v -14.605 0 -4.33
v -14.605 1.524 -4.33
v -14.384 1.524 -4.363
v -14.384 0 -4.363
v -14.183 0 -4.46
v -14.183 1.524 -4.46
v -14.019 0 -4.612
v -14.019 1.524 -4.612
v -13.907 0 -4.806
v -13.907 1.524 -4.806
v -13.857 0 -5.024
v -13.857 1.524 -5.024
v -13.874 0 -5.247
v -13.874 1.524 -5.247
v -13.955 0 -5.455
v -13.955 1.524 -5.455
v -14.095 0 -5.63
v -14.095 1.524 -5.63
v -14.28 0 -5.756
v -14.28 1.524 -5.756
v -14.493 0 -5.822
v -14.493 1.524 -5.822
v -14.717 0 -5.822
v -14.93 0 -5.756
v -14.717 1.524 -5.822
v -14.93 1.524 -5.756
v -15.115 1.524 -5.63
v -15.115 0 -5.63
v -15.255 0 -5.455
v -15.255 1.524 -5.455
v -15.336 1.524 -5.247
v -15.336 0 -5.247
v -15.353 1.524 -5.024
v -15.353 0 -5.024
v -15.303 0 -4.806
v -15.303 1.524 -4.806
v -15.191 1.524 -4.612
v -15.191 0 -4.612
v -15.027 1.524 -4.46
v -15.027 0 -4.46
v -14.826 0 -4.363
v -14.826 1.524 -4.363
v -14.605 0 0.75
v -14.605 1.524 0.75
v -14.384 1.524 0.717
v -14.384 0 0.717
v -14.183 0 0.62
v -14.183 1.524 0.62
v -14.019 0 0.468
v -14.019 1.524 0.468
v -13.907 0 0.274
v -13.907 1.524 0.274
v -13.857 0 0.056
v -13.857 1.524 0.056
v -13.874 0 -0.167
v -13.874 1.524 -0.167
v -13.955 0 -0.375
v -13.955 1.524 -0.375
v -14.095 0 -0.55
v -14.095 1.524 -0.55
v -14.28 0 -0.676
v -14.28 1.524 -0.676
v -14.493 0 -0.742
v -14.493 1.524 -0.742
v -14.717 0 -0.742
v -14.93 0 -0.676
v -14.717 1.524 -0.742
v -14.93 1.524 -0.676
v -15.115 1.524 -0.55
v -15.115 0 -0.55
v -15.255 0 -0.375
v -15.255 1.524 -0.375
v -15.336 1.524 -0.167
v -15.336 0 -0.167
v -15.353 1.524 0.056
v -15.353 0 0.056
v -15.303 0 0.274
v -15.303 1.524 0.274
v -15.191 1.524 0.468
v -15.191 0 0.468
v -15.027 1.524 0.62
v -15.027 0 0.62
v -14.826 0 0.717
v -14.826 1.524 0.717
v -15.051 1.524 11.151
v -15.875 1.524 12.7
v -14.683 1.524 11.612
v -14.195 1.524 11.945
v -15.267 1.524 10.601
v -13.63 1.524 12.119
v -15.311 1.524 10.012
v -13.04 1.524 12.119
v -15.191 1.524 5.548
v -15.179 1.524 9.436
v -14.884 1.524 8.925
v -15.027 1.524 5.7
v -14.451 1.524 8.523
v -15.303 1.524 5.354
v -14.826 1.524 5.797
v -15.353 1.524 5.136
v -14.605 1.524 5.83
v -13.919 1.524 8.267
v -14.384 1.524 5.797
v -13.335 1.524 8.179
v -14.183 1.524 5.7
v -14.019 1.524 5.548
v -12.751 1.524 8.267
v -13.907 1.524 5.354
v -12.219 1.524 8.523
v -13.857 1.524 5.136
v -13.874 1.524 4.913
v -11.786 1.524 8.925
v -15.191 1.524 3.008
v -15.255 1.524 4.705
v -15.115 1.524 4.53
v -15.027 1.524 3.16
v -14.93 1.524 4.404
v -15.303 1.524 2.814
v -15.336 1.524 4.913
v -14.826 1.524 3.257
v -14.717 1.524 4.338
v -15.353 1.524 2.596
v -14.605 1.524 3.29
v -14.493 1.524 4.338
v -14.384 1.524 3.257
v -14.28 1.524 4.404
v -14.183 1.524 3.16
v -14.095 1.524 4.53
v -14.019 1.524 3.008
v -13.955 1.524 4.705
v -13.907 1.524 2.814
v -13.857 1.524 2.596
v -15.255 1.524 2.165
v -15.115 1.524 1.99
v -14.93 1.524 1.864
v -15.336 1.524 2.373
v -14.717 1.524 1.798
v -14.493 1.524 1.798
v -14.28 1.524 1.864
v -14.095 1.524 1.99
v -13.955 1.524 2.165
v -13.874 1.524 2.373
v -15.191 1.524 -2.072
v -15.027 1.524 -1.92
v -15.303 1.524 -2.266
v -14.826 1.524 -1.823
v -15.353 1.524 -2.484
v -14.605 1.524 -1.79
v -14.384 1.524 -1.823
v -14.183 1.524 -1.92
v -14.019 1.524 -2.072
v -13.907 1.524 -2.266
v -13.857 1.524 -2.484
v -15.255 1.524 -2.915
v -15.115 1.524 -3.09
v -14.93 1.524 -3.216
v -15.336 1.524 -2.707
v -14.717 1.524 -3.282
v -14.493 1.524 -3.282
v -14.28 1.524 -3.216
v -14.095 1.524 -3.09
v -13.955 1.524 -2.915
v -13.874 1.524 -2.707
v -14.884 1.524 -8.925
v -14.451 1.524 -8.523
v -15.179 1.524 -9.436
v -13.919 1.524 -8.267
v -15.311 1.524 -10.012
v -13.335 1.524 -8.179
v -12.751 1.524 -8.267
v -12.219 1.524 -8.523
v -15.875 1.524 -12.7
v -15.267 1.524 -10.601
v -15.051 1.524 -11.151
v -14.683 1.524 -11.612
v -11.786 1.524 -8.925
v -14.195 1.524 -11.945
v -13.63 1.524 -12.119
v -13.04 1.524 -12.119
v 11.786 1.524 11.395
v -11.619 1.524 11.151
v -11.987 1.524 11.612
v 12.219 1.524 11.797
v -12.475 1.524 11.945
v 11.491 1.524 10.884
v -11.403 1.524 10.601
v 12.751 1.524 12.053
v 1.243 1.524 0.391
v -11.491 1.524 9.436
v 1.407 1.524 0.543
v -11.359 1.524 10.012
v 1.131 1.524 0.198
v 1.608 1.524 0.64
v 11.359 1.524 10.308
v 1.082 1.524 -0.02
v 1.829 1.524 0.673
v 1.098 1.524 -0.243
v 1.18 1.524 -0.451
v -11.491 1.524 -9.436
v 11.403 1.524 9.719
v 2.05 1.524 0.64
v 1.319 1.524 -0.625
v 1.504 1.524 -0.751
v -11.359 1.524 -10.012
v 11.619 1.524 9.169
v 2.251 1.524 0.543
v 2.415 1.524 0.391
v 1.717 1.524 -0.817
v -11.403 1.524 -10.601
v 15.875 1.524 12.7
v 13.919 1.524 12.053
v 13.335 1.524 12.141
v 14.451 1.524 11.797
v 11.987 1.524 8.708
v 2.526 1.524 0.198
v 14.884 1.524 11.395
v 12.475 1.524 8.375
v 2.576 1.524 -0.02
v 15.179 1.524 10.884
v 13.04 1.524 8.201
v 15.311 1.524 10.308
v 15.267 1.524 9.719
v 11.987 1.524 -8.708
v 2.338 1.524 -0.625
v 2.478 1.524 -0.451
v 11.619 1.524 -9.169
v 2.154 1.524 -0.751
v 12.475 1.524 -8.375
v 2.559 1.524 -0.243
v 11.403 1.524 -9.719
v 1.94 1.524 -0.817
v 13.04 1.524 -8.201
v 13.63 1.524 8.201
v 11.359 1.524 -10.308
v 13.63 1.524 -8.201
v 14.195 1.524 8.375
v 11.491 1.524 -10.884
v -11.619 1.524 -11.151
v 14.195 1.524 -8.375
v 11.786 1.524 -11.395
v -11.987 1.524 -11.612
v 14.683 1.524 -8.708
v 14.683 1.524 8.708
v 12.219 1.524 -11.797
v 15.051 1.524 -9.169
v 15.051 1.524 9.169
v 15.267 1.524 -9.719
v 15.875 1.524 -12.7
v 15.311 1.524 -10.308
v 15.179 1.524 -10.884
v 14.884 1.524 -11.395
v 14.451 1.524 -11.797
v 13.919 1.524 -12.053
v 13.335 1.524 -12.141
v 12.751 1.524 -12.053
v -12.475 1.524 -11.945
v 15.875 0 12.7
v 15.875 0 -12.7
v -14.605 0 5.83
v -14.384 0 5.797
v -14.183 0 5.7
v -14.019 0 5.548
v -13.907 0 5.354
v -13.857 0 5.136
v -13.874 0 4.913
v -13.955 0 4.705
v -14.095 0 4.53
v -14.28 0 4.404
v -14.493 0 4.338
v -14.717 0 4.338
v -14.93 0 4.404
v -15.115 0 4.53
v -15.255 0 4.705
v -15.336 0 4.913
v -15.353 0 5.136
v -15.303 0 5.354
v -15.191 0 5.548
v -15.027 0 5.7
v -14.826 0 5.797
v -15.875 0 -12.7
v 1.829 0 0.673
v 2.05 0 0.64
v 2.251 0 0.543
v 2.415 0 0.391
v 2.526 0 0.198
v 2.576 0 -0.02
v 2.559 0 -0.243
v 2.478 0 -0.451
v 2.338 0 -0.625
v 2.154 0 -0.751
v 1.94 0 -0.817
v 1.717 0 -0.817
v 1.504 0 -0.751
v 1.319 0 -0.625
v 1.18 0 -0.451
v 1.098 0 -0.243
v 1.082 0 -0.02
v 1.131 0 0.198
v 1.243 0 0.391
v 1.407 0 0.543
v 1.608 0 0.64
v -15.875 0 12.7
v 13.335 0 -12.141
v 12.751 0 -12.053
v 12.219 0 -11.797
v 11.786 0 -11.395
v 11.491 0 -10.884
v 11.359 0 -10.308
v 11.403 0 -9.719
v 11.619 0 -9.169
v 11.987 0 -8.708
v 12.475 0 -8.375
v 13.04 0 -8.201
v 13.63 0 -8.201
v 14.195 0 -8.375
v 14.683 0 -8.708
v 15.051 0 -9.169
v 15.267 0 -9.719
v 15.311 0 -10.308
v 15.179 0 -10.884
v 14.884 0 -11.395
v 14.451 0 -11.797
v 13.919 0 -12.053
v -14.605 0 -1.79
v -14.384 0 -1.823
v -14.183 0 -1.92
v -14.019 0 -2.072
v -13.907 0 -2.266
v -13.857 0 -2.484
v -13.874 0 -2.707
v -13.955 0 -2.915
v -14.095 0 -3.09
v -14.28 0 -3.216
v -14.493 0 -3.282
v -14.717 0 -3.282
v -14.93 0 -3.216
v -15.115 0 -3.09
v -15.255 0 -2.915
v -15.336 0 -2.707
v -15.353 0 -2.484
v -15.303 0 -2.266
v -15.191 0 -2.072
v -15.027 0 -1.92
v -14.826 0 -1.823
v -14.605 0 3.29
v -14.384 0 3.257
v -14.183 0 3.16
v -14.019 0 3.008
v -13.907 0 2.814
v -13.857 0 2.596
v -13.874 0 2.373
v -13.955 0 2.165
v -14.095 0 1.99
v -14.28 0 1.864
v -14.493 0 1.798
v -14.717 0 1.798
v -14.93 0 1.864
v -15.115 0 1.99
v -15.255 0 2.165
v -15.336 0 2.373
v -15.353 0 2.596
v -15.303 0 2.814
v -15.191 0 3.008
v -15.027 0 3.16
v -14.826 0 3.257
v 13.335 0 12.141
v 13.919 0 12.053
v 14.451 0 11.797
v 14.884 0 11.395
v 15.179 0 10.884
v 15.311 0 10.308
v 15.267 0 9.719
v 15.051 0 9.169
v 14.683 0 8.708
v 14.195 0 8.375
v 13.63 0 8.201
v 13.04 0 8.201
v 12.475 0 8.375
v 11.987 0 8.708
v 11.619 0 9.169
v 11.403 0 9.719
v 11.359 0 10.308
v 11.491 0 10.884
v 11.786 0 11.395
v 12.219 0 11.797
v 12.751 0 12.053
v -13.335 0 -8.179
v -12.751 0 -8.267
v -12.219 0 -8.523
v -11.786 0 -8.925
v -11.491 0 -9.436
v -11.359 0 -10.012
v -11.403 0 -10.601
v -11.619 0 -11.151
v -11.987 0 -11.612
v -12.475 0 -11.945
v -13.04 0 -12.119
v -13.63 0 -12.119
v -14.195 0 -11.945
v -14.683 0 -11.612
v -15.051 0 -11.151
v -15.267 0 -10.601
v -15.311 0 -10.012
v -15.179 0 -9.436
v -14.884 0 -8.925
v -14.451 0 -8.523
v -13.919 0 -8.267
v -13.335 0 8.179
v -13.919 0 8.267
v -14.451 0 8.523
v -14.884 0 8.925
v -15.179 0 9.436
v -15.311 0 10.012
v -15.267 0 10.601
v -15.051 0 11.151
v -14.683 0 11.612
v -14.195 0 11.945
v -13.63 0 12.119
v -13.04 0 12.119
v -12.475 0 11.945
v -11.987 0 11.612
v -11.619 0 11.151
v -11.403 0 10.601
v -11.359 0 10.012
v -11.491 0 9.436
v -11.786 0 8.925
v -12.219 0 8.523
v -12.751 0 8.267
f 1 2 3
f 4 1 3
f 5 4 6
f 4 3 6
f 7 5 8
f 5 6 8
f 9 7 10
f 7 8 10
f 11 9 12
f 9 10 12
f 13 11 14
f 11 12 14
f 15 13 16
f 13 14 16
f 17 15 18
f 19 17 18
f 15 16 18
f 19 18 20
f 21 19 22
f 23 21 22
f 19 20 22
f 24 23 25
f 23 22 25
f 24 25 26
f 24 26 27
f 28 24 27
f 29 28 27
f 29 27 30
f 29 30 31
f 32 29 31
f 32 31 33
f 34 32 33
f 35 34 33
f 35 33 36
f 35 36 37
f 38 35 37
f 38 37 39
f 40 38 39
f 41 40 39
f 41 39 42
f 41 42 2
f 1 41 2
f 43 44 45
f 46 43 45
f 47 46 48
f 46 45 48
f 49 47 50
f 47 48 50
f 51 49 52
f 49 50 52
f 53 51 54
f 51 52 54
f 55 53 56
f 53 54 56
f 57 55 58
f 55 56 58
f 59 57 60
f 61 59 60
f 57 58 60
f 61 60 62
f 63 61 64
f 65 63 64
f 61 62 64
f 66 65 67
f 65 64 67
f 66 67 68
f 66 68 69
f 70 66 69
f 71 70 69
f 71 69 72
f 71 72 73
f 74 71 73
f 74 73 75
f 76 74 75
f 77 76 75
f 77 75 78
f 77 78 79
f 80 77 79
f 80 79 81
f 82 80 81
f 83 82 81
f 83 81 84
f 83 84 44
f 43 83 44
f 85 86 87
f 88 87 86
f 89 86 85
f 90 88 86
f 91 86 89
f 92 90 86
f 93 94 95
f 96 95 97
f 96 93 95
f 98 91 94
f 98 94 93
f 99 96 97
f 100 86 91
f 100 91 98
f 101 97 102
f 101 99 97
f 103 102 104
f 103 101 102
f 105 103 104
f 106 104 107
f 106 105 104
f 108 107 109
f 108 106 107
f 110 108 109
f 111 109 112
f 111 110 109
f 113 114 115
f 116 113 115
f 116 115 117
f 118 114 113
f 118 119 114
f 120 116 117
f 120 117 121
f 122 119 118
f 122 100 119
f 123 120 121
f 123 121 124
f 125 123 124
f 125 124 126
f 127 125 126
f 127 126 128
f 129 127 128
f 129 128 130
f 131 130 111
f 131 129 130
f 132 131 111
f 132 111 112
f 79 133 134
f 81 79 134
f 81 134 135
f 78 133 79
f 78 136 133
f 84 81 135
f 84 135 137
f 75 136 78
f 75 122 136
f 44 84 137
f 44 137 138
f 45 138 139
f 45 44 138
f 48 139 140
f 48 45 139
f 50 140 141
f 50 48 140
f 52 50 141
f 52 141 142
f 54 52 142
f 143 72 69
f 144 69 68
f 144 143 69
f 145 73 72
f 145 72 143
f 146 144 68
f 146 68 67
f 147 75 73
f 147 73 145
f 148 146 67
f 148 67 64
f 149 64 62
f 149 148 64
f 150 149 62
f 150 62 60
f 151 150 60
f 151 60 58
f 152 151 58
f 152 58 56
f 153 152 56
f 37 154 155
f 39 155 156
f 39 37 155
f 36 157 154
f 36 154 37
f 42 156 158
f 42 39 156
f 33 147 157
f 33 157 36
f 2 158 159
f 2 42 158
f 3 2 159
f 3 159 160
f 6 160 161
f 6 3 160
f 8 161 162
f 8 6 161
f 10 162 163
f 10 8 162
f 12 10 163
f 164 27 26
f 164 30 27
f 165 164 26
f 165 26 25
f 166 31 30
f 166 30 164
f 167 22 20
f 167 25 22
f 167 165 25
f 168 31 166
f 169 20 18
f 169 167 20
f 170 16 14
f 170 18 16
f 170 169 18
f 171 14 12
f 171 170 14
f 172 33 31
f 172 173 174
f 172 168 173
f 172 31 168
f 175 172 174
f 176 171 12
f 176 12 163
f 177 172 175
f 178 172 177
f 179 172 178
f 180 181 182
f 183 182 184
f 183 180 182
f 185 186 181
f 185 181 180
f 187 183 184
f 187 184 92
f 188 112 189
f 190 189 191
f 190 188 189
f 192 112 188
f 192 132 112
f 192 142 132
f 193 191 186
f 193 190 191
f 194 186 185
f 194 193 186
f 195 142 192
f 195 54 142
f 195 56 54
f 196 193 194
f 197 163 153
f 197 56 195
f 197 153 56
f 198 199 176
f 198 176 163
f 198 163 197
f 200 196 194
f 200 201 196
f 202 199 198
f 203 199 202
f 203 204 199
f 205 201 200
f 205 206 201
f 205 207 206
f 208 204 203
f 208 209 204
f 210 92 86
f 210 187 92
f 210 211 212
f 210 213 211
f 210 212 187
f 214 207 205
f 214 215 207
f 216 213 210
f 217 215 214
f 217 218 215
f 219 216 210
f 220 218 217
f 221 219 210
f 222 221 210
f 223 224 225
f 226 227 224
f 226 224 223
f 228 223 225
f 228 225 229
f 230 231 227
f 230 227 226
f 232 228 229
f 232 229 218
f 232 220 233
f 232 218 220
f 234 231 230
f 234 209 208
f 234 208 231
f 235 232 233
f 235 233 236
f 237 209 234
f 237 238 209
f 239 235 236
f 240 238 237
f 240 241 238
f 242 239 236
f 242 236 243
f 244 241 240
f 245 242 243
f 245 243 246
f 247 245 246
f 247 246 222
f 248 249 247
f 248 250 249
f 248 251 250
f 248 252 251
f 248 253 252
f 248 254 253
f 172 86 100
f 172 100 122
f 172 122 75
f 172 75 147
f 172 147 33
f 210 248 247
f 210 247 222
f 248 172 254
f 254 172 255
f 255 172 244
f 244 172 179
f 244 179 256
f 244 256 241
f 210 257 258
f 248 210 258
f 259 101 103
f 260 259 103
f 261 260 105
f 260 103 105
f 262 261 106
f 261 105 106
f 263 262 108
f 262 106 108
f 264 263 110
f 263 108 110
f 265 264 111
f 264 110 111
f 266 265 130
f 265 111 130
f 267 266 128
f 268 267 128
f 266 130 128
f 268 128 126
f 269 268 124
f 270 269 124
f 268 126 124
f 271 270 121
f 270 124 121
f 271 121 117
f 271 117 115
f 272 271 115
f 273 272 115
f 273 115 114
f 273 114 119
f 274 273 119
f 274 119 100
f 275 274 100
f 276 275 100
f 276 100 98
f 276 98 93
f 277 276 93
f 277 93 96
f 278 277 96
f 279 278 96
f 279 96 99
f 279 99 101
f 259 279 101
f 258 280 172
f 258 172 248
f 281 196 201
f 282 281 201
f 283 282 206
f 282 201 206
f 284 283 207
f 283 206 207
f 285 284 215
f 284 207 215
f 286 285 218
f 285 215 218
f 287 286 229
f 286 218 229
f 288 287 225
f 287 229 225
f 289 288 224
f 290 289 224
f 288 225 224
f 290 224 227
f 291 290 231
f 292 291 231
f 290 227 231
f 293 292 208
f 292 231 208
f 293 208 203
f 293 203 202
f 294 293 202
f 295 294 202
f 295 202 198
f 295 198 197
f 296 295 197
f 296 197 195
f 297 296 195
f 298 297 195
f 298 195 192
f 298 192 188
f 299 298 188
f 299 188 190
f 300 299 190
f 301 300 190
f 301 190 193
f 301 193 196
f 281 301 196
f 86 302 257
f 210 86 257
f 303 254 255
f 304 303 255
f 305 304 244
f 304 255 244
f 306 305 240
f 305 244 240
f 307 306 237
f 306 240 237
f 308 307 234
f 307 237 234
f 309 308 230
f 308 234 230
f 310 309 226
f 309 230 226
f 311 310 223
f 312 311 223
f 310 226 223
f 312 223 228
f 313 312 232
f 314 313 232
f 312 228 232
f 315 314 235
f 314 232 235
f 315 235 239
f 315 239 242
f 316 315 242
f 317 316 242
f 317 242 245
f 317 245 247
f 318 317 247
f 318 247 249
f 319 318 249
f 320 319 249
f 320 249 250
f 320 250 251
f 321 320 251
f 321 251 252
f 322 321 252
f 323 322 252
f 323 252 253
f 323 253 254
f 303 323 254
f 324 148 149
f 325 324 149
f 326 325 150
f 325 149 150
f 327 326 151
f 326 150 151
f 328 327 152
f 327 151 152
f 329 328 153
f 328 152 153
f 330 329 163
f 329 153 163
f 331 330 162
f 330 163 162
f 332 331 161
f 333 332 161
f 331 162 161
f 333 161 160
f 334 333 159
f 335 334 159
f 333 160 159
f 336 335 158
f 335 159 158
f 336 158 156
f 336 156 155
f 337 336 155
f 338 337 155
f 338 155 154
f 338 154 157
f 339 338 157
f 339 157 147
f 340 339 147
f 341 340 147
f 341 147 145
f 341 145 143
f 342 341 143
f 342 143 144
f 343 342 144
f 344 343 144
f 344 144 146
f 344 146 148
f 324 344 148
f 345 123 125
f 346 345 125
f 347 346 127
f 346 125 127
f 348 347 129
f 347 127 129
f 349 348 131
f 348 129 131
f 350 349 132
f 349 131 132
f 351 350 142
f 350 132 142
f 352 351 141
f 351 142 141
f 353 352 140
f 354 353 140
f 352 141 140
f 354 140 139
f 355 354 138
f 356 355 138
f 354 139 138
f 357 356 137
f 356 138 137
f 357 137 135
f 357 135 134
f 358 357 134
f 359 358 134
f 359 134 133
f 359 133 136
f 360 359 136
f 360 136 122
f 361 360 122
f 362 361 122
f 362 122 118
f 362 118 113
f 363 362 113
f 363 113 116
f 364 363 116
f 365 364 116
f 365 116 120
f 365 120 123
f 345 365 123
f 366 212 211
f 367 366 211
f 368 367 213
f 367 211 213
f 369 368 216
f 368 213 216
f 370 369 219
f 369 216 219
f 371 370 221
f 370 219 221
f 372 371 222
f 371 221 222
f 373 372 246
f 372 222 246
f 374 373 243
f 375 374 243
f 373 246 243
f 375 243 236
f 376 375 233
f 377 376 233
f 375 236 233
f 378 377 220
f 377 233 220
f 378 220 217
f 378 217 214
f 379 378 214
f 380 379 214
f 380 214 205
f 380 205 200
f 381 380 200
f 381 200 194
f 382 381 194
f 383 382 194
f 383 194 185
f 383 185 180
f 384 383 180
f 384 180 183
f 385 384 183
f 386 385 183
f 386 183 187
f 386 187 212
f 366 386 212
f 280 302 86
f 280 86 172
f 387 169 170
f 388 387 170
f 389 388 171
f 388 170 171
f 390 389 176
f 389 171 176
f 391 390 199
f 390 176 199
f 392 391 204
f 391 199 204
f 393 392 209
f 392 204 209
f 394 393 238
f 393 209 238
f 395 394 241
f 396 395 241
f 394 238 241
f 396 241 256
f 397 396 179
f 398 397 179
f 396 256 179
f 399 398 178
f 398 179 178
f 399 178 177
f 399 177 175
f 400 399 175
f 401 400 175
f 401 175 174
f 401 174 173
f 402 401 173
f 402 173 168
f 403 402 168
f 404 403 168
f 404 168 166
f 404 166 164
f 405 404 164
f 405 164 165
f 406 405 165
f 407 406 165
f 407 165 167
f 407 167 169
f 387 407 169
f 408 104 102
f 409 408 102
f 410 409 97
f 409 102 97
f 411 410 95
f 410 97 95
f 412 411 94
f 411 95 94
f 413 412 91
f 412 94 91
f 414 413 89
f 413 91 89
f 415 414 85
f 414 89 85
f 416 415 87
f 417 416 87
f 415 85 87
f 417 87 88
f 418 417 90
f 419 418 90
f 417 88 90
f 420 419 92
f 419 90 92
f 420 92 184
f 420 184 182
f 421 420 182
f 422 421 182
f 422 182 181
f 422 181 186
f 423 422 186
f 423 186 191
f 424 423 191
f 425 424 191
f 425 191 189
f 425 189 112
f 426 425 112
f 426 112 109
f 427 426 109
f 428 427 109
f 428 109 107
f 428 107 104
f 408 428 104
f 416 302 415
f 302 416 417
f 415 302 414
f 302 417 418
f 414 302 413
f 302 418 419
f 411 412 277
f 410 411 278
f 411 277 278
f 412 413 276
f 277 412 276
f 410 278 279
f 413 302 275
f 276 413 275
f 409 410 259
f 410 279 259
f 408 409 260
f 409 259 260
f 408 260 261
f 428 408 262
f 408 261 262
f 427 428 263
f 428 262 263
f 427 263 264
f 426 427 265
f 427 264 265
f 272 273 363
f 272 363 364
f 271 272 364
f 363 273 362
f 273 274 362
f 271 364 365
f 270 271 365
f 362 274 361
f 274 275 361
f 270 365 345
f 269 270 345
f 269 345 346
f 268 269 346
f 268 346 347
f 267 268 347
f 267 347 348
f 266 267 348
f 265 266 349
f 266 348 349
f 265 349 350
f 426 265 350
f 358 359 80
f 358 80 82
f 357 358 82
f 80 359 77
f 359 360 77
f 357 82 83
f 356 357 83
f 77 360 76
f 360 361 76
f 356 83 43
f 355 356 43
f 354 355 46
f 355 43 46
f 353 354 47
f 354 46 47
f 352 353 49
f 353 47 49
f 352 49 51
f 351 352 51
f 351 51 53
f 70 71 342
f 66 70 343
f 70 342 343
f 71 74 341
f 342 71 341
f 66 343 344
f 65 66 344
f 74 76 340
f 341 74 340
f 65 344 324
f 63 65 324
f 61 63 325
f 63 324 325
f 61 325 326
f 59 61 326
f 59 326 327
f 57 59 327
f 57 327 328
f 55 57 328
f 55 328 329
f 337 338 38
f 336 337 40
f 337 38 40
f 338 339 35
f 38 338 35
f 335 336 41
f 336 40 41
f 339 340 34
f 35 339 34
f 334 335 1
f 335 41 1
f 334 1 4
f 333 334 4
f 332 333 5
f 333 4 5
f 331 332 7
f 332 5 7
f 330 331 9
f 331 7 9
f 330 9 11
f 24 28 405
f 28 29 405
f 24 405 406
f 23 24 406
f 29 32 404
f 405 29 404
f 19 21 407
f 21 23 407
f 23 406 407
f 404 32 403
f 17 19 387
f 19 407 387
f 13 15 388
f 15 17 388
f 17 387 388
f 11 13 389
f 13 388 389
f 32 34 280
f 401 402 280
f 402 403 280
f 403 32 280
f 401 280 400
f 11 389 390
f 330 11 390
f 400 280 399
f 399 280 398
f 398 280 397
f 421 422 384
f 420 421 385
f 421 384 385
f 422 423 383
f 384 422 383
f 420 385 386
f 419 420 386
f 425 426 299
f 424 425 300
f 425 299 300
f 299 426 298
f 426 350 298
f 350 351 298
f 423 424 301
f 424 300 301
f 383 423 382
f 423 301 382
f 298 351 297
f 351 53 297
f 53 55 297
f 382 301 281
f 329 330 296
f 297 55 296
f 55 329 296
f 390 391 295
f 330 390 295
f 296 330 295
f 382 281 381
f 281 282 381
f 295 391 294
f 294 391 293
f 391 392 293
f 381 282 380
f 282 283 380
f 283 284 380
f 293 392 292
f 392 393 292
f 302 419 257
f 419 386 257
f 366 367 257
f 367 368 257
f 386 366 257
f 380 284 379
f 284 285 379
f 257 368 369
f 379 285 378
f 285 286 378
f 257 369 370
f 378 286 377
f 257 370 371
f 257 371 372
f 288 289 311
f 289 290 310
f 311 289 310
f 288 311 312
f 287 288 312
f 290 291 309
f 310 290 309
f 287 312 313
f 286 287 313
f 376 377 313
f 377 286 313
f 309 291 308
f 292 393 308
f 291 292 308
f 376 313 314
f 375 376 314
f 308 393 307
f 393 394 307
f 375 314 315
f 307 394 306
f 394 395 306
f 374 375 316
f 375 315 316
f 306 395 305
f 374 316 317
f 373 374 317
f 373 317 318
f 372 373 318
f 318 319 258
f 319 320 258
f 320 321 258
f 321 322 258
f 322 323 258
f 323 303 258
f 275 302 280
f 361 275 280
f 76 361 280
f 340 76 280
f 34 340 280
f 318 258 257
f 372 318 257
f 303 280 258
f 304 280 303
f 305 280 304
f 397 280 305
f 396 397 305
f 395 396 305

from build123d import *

# Parameters (mm, degrees)
SKETCH1_W           = 31.75
SKETCH1_H           = 25.4
BOSS_EXTRUDE1_DEPTH = 1.524
CUT_EXTRUDE1_REACH  = 22.387
SKETCH2_R           = 1.9812
CUT_EXTRUDE2_REACH  = 22.387
SKETCH3_R           = 0.75
LPATTERN1_COUNT     = 5
LPATTERN1_PITCH     = 2.54
CUT_EXTRUDE3_REACH  = 22.387
SKETCH4_R           = 0.7493


with BuildPart() as part:
    # Sketch1 → Boss-Extrude1 (new body)
    with BuildSketch(Plane(origin=(0, 0, 0), x_dir=(1, 0, 0), z_dir=(0, 1, 0))):
        Rectangle(SKETCH1_W, SKETCH1_H)
    extrude(amount=BOSS_EXTRUDE1_DEPTH)

    # Sketch2 → Cut-Extrude1 (cut, up to next)
    with BuildSketch(Plane(origin=(0, 1.524, 0), x_dir=(1, 0, 0), z_dir=(0, 1, 0)), mode=Mode.PRIVATE) as cut_extrude1_sk1:
        with Locations(Location((-13.335, 10.16, 0), (0, 0, 270))):
            Circle(SKETCH2_R)
    cut_extrude1_tool1 = extrude(cut_extrude1_sk1.sketch, amount=-CUT_EXTRUDE1_REACH, mode=Mode.PRIVATE) & part.part
    # Sketch2 → Cut-Extrude1 (cut, up to next)
    with BuildSketch(Plane(origin=(0, 1.524, 0), x_dir=(1, 0, 0), z_dir=(0, 1, 0)), mode=Mode.PRIVATE) as cut_extrude1_sk2:
        with Locations(Location((13.335, 10.16, 0), (0, 0, 90))):
            Circle(SKETCH2_R)
    cut_extrude1_tool2 = extrude(cut_extrude1_sk2.sketch, amount=-CUT_EXTRUDE1_REACH, mode=Mode.PRIVATE) & part.part
    # Sketch2 → Cut-Extrude1 (cut, up to next)
    with BuildSketch(Plane(origin=(0, 1.524, 0), x_dir=(1, 0, 0), z_dir=(0, 1, 0)), mode=Mode.PRIVATE) as cut_extrude1_sk3:
        with Locations(Location((-13.335, -10.16, 0), (0, 0, 90))):
            Circle(SKETCH2_R)
    cut_extrude1_tool3 = extrude(cut_extrude1_sk3.sketch, amount=-CUT_EXTRUDE1_REACH, mode=Mode.PRIVATE) & part.part
    # Sketch2 → Cut-Extrude1 (cut, up to next)
    with BuildSketch(Plane(origin=(0, 1.524, 0), x_dir=(1, 0, 0), z_dir=(0, 1, 0)), mode=Mode.PRIVATE) as cut_extrude1_sk4:
        with Locations(Location((13.335, -10.16, 0), (0, 0, 270))):
            Circle(SKETCH2_R)
    cut_extrude1_tool4 = extrude(cut_extrude1_sk4.sketch, amount=-CUT_EXTRUDE1_REACH, mode=Mode.PRIVATE) & part.part
    add(cut_extrude1_tool1.solids().sort_by_distance((-13.335, 1.524, -10.16))[0], mode=Mode.SUBTRACT)
    add(cut_extrude1_tool2.solids().sort_by_distance((13.335, 1.524, -10.16))[0], mode=Mode.SUBTRACT)
    add(cut_extrude1_tool3.solids().sort_by_distance((-13.335, 1.524, 10.16))[0], mode=Mode.SUBTRACT)
    add(cut_extrude1_tool4.solids().sort_by_distance((13.335, 1.524, 10.16))[0], mode=Mode.SUBTRACT)

    # Sketch3 → Cut-Extrude2 (cut, up to next)
    with BuildSketch(Plane(origin=(0, 1.524, 0), x_dir=(1, 0, 0), z_dir=(0, 1, 0)), mode=Mode.PRIVATE) as cut_extrude2_sk1:
        with Locations(Location((-14.605, 5.08, 0), (0, 0, 270))):
            Circle(SKETCH3_R)
    cut_extrude2_tool1 = extrude(cut_extrude2_sk1.sketch, amount=-CUT_EXTRUDE2_REACH, mode=Mode.PRIVATE) & part.part
    cut_extrude2 = cut_extrude2_tool1.solids().sort_by_distance((-14.605, 1.524, -5.08))[0]
    add(cut_extrude2, mode=Mode.SUBTRACT)

    # LPattern1: Cut-Extrude2 ×5
    with Locations(*[(0, 0, i * LPATTERN1_PITCH) for i in range(1, LPATTERN1_COUNT)]):
        add(cut_extrude2, mode=Mode.SUBTRACT)

    # Sketch4 → Cut-Extrude3 (cut, up to next)
    with BuildSketch(Plane(origin=(0, 1.524, 0), x_dir=(1, 0, 0), z_dir=(0, 1, 0)), mode=Mode.PRIVATE) as cut_extrude3_sk1:
        with Locations(Location((1.8288, 0.0762, 0), (0, 0, 270))):
            Circle(SKETCH4_R)
    cut_extrude3_tool1 = extrude(cut_extrude3_sk1.sketch, amount=-CUT_EXTRUDE3_REACH, mode=Mode.PRIVATE) & part.part
    add(cut_extrude3_tool1.solids().sort_by_distance((1.8288, 1.524, -0.0762))[0], mode=Mode.SUBTRACT)


solid = part.part
